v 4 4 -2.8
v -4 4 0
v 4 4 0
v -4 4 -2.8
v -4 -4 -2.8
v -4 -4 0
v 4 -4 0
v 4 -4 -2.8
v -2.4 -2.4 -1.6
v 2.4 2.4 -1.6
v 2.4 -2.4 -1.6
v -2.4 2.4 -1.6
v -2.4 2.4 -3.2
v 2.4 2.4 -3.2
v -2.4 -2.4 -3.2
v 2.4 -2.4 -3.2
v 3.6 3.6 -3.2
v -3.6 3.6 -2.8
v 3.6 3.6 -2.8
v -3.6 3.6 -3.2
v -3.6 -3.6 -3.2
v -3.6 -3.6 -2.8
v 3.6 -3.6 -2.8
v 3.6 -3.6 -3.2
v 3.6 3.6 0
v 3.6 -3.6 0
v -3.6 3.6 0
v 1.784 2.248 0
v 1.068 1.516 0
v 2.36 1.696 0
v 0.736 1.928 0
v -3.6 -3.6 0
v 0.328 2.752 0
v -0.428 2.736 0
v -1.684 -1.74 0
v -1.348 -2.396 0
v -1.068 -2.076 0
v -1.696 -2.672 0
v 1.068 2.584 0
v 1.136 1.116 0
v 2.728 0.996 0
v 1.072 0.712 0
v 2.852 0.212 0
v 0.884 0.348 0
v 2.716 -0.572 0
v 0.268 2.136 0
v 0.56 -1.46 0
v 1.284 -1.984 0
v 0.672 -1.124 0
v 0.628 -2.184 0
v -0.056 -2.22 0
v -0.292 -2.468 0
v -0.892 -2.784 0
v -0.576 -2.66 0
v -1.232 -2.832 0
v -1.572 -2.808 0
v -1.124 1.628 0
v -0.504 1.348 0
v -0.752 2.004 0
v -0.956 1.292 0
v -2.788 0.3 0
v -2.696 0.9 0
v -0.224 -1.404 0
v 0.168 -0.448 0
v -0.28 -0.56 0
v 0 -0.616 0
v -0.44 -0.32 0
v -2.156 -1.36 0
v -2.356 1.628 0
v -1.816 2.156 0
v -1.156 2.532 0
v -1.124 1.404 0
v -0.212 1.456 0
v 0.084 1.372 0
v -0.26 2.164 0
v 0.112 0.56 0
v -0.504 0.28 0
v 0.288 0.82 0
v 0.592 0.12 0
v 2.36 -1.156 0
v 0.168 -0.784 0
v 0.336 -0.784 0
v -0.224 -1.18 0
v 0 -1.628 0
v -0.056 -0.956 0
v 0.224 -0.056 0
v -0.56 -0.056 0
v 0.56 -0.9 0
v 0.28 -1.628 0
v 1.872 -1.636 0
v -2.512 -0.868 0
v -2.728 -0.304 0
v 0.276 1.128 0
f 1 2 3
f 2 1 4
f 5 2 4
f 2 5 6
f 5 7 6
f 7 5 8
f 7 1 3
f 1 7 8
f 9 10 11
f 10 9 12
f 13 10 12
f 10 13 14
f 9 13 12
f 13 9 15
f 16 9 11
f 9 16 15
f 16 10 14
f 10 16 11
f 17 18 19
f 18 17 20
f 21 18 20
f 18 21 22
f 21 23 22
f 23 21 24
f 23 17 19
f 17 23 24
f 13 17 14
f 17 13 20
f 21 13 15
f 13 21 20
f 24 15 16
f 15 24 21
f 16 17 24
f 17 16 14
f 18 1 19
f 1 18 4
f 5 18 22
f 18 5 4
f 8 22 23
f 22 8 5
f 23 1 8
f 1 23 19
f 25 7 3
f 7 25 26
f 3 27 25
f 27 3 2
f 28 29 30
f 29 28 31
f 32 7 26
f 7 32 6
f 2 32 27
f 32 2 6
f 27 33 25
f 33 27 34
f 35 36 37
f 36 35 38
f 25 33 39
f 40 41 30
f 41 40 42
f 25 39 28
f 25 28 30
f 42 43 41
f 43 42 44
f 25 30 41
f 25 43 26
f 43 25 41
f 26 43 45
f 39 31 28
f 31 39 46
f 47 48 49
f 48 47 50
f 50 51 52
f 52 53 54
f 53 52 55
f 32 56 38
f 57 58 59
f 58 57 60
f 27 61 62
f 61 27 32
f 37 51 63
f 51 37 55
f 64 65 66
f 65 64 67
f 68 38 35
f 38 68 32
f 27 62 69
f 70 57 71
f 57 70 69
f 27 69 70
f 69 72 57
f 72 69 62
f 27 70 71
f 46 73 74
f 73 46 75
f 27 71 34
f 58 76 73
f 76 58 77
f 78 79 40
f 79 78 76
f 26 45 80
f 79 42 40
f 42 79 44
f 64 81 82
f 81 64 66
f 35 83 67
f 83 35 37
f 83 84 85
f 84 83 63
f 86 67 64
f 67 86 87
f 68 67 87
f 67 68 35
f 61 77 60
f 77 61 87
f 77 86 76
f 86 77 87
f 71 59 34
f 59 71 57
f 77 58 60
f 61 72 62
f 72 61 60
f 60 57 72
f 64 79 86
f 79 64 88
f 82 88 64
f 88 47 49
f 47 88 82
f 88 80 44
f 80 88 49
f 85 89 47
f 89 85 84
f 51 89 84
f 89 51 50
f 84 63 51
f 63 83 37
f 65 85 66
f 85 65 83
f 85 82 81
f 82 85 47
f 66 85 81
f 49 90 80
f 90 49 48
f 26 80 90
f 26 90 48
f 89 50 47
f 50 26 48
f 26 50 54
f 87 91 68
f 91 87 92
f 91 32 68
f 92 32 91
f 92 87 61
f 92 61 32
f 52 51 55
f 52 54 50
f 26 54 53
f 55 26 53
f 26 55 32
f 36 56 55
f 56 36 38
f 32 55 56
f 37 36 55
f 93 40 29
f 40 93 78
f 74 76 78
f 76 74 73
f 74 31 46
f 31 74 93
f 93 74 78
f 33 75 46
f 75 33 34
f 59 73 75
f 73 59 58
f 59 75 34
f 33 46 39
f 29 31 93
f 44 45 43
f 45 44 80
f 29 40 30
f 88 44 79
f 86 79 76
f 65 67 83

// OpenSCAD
// file: ../p/4-4edge.scad
use <../lib.scad>
$fa=1; $fs=0.2;
function ldraw_lib__4_4edge(realsolid=false) = [
// 0 Circle 1.0
// 0 Name: 4-4edge.dat
// 0 Author: James Jessiman
// 0 !LDRAW_ORG Primitive UPDATE 2017-01
// 0 !LICENSE Licensed under CC BY 2.0 and CC BY 4.0 : see CAreadme.txt
// 
// 0 BFC CERTIFY CCW
  [0,"BFC","CERTIFY"],
  [0,"BFC","CCW"],
// 
// 0 !HISTORY 1998-12-15 [PTadmin] Official Update 1998-10
// 0 !HISTORY 2005-12-28 [PTadmin] Official Update 2005-01
// 0 !HISTORY 2007-06-24 [PTadmin] Header formatted for Contributor Agreement
// 0 !HISTORY 2008-07-01 [PTadmin] Official Update 2008-01
// 0 !HISTORY 2017-01-15 [Steffen] BFCed
// 0 !HISTORY 2017-12-30 [PTadmin] Official Update 2017-01
// 
// 
// 2 24 1 0 0 0.9239 0 0.3827
  [2,24,1,0,0,0.9239,0,0.3827],
// 2 24 0.9239 0 0.3827 0.7071 0 0.7071
  [2,24,0.9239,0,0.3827,0.7071,0,0.7071],
// 2 24 0.7071 0 0.7071 0.3827 0 0.9239
  [2,24,0.7071,0,0.7071,0.3827,0,0.9239],
// 2 24 0.3827 0 0.9239 0 0 1
  [2,24,0.3827,0,0.9239,0,0,1],
// 2 24 0 0 1 -0.3827 0 0.9239
  [2,24,0,0,1,-0.3827,0,0.9239],
// 2 24 -0.3827 0 0.9239 -0.7071 0 0.7071
  [2,24,-0.3827,0,0.9239,-0.7071,0,0.7071],
// 2 24 -0.7071 0 0.7071 -0.9239 0 0.3827
  [2,24,-0.7071,0,0.7071,-0.9239,0,0.3827],
// 2 24 -0.9239 0 0.3827 -1 0 -0
  [2,24,-0.9239,0,0.3827,-1,0,-0],
// 2 24 -1 0 -0 -0.9239 0 -0.3827
  [2,24,-1,0,-0,-0.9239,0,-0.3827],
// 2 24 -0.9239 0 -0.3827 -0.7071 0 -0.7071
  [2,24,-0.9239,0,-0.3827,-0.7071,0,-0.7071],
// 2 24 -0.7071 0 -0.7071 -0.3827 0 -0.9239
  [2,24,-0.7071,0,-0.7071,-0.3827,0,-0.9239],
// 2 24 -0.3827 0 -0.9239 0 0 -1
  [2,24,-0.3827,0,-0.9239,0,0,-1],
// 2 24 0 0 -1 0.3827 0 -0.9239
  [2,24,0,0,-1,0.3827,0,-0.9239],
// 2 24 0.3827 0 -0.9239 0.7071 0 -0.7071
  [2,24,0.3827,0,-0.9239,0.7071,0,-0.7071],
// 2 24 0.7071 0 -0.7071 0.9239 0 -0.3827
  [2,24,0.7071,0,-0.7071,0.9239,0,-0.3827],
// 2 24 0.9239 0 -0.3827 1 0 0
  [2,24,0.9239,0,-0.3827,1,0,0],
];
module ldraw_lib__4_4edge(step=0, col=false, unit=2/5, alt=false, line=0.2, solid=!$preview)
    makepoly(ldraw_lib__4_4edge(solid), step=step, col=col, unit=unit, alt=alt, line=line, solid=solid);
ldraw_lib__4_4edge(line=0.2);
// file: ../p/4-4disc.scad
use <../lib.scad>
$fa=1; $fs=0.2;
function ldraw_lib__4_4disc(realsolid=false) = [
// 0 Disc 1.0
// 0 Name: 4-4disc.dat
// 0 Author: James Jessiman
// 0 !LDRAW_ORG Primitive UPDATE 2002-02
// 0 !LICENSE Licensed under CC BY 2.0 and CC BY 4.0 : see CAreadme.txt
// 
// 0 BFC CERTIFY CCW
  [0,"BFC","CERTIFY"],
  [0,"BFC","CCW"],
// 
// 0 !HISTORY 1998-12-15 [PTadmin] Official Update 1998-10
// 0 !HISTORY 2002-03-23 [sbliss] Added BFC statement
// 0 !HISTORY 2002-04-25 [PTadmin] Official Update 2002-02
// 0 !HISTORY 2007-06-24 [PTadmin] Header formatted for Contributor Agreement
// 0 !HISTORY 2008-07-01 [PTadmin] Official Update 2008-01
// 
// 
// 3 16 0 0 0 1 0 0 0.9239 0 0.3827
  [3,16,0,0,0,1,0,0,0.9239,0,0.3827],
// 3 16 0 0 0 0.9239 0 0.3827 0.7071 0 0.7071
  [3,16,0,0,0,0.9239,0,0.3827,0.7071,0,0.7071],
// 3 16 0 0 0 0.7071 0 0.7071 0.3827 0 0.9239
  [3,16,0,0,0,0.7071,0,0.7071,0.3827,0,0.9239],
// 3 16 0 0 0 0.3827 0 0.9239 0 0 1
  [3,16,0,0,0,0.3827,0,0.9239,0,0,1],
// 3 16 0 0 0 0 0 1 -0.3827 0 0.9239
  [3,16,0,0,0,0,0,1,-0.3827,0,0.9239],
// 3 16 0 0 0 -0.3827 0 0.9239 -0.7071 0 0.7071
  [3,16,0,0,0,-0.3827,0,0.9239,-0.7071,0,0.7071],
// 3 16 0 0 0 -0.7071 0 0.7071 -0.9239 0 0.3827
  [3,16,0,0,0,-0.7071,0,0.7071,-0.9239,0,0.3827],
// 3 16 0 0 0 -0.9239 0 0.3827 -1 0 -0
  [3,16,0,0,0,-0.9239,0,0.3827,-1,0,-0],
// 3 16 0 0 0 -1 0 -0 -0.9239 0 -0.3827
  [3,16,0,0,0,-1,0,-0,-0.9239,0,-0.3827],
// 3 16 0 0 0 -0.9239 0 -0.3827 -0.7071 0 -0.7071
  [3,16,0,0,0,-0.9239,0,-0.3827,-0.7071,0,-0.7071],
// 3 16 0 0 0 -0.7071 0 -0.7071 -0.3827 0 -0.9239
  [3,16,0,0,0,-0.7071,0,-0.7071,-0.3827,0,-0.9239],
// 3 16 0 0 0 -0.3827 0 -0.9239 0 0 -1
  [3,16,0,0,0,-0.3827,0,-0.9239,0,0,-1],
// 3 16 0 0 0 0 0 -1 0.3827 0 -0.9239
  [3,16,0,0,0,0,0,-1,0.3827,0,-0.9239],
// 3 16 0 0 0 0.3827 0 -0.9239 0.7071 0 -0.7071
  [3,16,0,0,0,0.3827,0,-0.9239,0.7071,0,-0.7071],
// 3 16 0 0 0 0.7071 0 -0.7071 0.9239 0 -0.3827
  [3,16,0,0,0,0.7071,0,-0.7071,0.9239,0,-0.3827],
// 3 16 0 0 0 0.9239 0 -0.3827 1 0 0
  [3,16,0,0,0,0.9239,0,-0.3827,1,0,0],
// 0
];
module ldraw_lib__4_4disc(step=0, col=false, unit=2/5, alt=false, line=0.2, solid=!$preview)
    makepoly(ldraw_lib__4_4disc(solid), step=step, col=col, unit=unit, alt=alt, line=line, solid=solid);
ldraw_lib__4_4disc(line=0.2);
// file: ../p/4-4cyli.scad
use <../lib.scad>
$fa=1; $fs=0.2;
function ldraw_lib__4_4cyli(realsolid=false) = [
// 0 Cylinder 1.0
// 0 Name: 4-4cyli.dat
// 0 Author: James Jessiman
// 0 !LDRAW_ORG Primitive UPDATE 2005-01
// 0 !LICENSE Licensed under CC BY 2.0 and CC BY 4.0 : see CAreadme.txt
// 
// 0 BFC CERTIFY CCW
  [0,"BFC","CERTIFY"],
  [0,"BFC","CCW"],
// 
// 0 !HISTORY 1998-12-15 [PTadmin] Official Update 1998-10
// 0 !HISTORY 2002-03-23 [sbliss] Added BFC statement; merged headers from files in distributions LDraw 0.27 and Complete.
// 0 !HISTORY 2002-04-25 [PTadmin] Official Update 2002-02
// 0 !HISTORY 2004-12-14 [guyvivan] BFC CCW
// 0 !HISTORY 2005-12-28 [PTadmin] Official Update 2005-01
// 0 !HISTORY 2007-06-24 [PTadmin] Header formatted for Contributor Agreement
// 0 !HISTORY 2008-07-01 [PTadmin] Official Update 2008-01
// 
// 
// 4 16 1 1 0 0.9239 1 0.3827 0.9239 0 0.3827 1 0 0
  [4,16,1,1,0,0.9239,1,0.3827,0.9239,0,0.3827,1,0,0],
// 5 24 1 0 0 1 1 0 0.9239 0 0.3827 0.9239 0 -0.3827
  [5,24,1,0,0,1,1,0,0.9239,0,0.3827,0.9239,0,-0.3827],
// 4 16 0.9239 1 0.3827 0.7071 1 0.7071 0.7071 0 0.7071 0.9239 0 0.3827
  [4,16,0.9239,1,0.3827,0.7071,1,0.7071,0.7071,0,0.7071,0.9239,0,0.3827],
// 5 24 0.9239 0 0.3827 0.9239 1 0.3827 0.7071 0 0.7071 1 0 0
  [5,24,0.9239,0,0.3827,0.9239,1,0.3827,0.7071,0,0.7071,1,0,0],
// 4 16 0.7071 1 0.7071 0.3827 1 0.9239 0.3827 0 0.9239 0.7071 0 0.7071
  [4,16,0.7071,1,0.7071,0.3827,1,0.9239,0.3827,0,0.9239,0.7071,0,0.7071],
// 5 24 0.7071 0 0.7071 0.7071 1 0.7071 0.3827 0 0.9239 0.9239 0 0.3827
  [5,24,0.7071,0,0.7071,0.7071,1,0.7071,0.3827,0,0.9239,0.9239,0,0.3827],
// 4 16 0.3827 1 0.9239 0 1 1 0 0 1 0.3827 0 0.9239
  [4,16,0.3827,1,0.9239,0,1,1,0,0,1,0.3827,0,0.9239],
// 5 24 0.3827 0 0.9239 0.3827 1 0.9239 0 0 1 0.7071 0 0.7071
  [5,24,0.3827,0,0.9239,0.3827,1,0.9239,0,0,1,0.7071,0,0.7071],
// 4 16 0 1 1 -0.3827 1 0.9239 -0.3827 0 0.9239 0 0 1
  [4,16,0,1,1,-0.3827,1,0.9239,-0.3827,0,0.9239,0,0,1],
// 5 24 0 0 1 0 1 1 -0.3827 0 0.9239 0.3827 0 0.9239
  [5,24,0,0,1,0,1,1,-0.3827,0,0.9239,0.3827,0,0.9239],
// 4 16 -0.3827 1 0.9239 -0.7071 1 0.7071 -0.7071 0 0.7071 -0.3827 0 0.9239
  [4,16,-0.3827,1,0.9239,-0.7071,1,0.7071,-0.7071,0,0.7071,-0.3827,0,0.9239],
// 5 24 -0.3827 0 0.9239 -0.3827 1 0.9239 -0.7071 0 0.7071 0 0 1
  [5,24,-0.3827,0,0.9239,-0.3827,1,0.9239,-0.7071,0,0.7071,0,0,1],
// 4 16 -0.7071 1 0.7071 -0.9239 1 0.3827 -0.9239 0 0.3827 -0.7071 0 0.7071
  [4,16,-0.7071,1,0.7071,-0.9239,1,0.3827,-0.9239,0,0.3827,-0.7071,0,0.7071],
// 5 24 -0.7071 0 0.7071 -0.7071 1 0.7071 -0.9239 0 0.3827 -0.3827 0 0.9239
  [5,24,-0.7071,0,0.7071,-0.7071,1,0.7071,-0.9239,0,0.3827,-0.3827,0,0.9239],
// 4 16 -0.9239 1 0.3827 -1 1 0 -1 0 0 -0.9239 0 0.3827
  [4,16,-0.9239,1,0.3827,-1,1,0,-1,0,0,-0.9239,0,0.3827],
// 5 24 -0.9239 0 0.3827 -0.9239 1 0.3827 -1 0 0 -0.7071 0 0.7071
  [5,24,-0.9239,0,0.3827,-0.9239,1,0.3827,-1,0,0,-0.7071,0,0.7071],
// 4 16 -1 1 0 -0.9239 1 -0.3827 -0.9239 0 -0.3827 -1 0 0
  [4,16,-1,1,0,-0.9239,1,-0.3827,-0.9239,0,-0.3827,-1,0,0],
// 5 24 -1 0 0 -1 1 0 -0.9239 0 -0.3827 -0.9239 0 0.3827
  [5,24,-1,0,0,-1,1,0,-0.9239,0,-0.3827,-0.9239,0,0.3827],
// 4 16 -0.9239 1 -0.3827 -0.7071 1 -0.7071 -0.7071 0 -0.7071 -0.9239 0 -0.3827
  [4,16,-0.9239,1,-0.3827,-0.7071,1,-0.7071,-0.7071,0,-0.7071,-0.9239,0,-0.3827],
// 5 24 -0.9239 0 -0.3827 -0.9239 1 -0.3827 -0.7071 0 -0.7071 -1 0 0
  [5,24,-0.9239,0,-0.3827,-0.9239,1,-0.3827,-0.7071,0,-0.7071,-1,0,0],
// 4 16 -0.7071 1 -0.7071 -0.3827 1 -0.9239 -0.3827 0 -0.9239 -0.7071 0 -0.7071
  [4,16,-0.7071,1,-0.7071,-0.3827,1,-0.9239,-0.3827,0,-0.9239,-0.7071,0,-0.7071],
// 5 24 -0.7071 0 -0.7071 -0.7071 1 -0.7071 -0.3827 0 -0.9239 -0.9239 0 -0.3827
  [5,24,-0.7071,0,-0.7071,-0.7071,1,-0.7071,-0.3827,0,-0.9239,-0.9239,0,-0.3827],
// 4 16 -0.3827 1 -0.9239 0 1 -1 0 0 -1 -0.3827 0 -0.9239
  [4,16,-0.3827,1,-0.9239,0,1,-1,0,0,-1,-0.3827,0,-0.9239],
// 5 24 -0.3827 0 -0.9239 -0.3827 1 -0.9239 0 0 -1 -0.7071 0 -0.7071
  [5,24,-0.3827,0,-0.9239,-0.3827,1,-0.9239,0,0,-1,-0.7071,0,-0.7071],
// 4 16 0 1 -1 0.3827 1 -0.9239 0.3827 0 -0.9239 0 0 -1
  [4,16,0,1,-1,0.3827,1,-0.9239,0.3827,0,-0.9239,0,0,-1],
// 5 24 0 0 -1 0 1 -1 0.3827 0 -0.9239 -0.3827 0 -0.9239
  [5,24,0,0,-1,0,1,-1,0.3827,0,-0.9239,-0.3827,0,-0.9239],
// 4 16 0.3827 1 -0.9239 0.7071 1 -0.7071 0.7071 0 -0.7071 0.3827 0 -0.9239
  [4,16,0.3827,1,-0.9239,0.7071,1,-0.7071,0.7071,0,-0.7071,0.3827,0,-0.9239],
// 5 24 0.3827 0 -0.9239 0.3827 1 -0.9239 0.7071 0 -0.7071 0 0 -1
  [5,24,0.3827,0,-0.9239,0.3827,1,-0.9239,0.7071,0,-0.7071,0,0,-1],
// 4 16 0.7071 1 -0.7071 0.9239 1 -0.3827 0.9239 0 -0.3827 0.7071 0 -0.7071
  [4,16,0.7071,1,-0.7071,0.9239,1,-0.3827,0.9239,0,-0.3827,0.7071,0,-0.7071],
// 5 24 0.7071 0 -0.7071 0.7071 1 -0.7071 0.9239 0 -0.3827 0.3827 0 -0.9239
  [5,24,0.7071,0,-0.7071,0.7071,1,-0.7071,0.9239,0,-0.3827,0.3827,0,-0.9239],
// 4 16 0.9239 1 -0.3827 1 1 0 1 0 0 0.9239 0 -0.3827
  [4,16,0.9239,1,-0.3827,1,1,0,1,0,0,0.9239,0,-0.3827],
// 5 24 0.9239 0 -0.3827 0.9239 1 -0.3827 1 0 0 0.7071 0 -0.7071
  [5,24,0.9239,0,-0.3827,0.9239,1,-0.3827,1,0,0,0.7071,0,-0.7071],
// 0
];
module ldraw_lib__4_4cyli(step=0, col=false, unit=2/5, alt=false, line=0.2, solid=!$preview)
    makepoly(ldraw_lib__4_4cyli(solid), step=step, col=col, unit=unit, alt=alt, line=line, solid=solid);
ldraw_lib__4_4cyli(line=0.2);
// file: ../p/stud3.scad
use <../lib.scad>
use <4-4cyli.scad>
use <4-4disc.scad>
use <4-4edge.scad>
$fa=1; $fs=0.2;
function ldraw_lib__stud3(realsolid=false) = realsolid ? 
    [openscad(translate([0,0,-eps()], o=cylinder(4+eps(), r=4)),2)] : [
// 0 Stud Tube Solid
// 0 Name: stud3.dat
// 0 Author: James Jessiman
// 0 !LDRAW_ORG Primitive UPDATE 2012-01
// 0 !LICENSE Licensed under CC BY 2.0 and CC BY 4.0 : see CAreadme.txt
// 
// 0 BFC CERTIFY CCW
  [0,"BFC","CERTIFY"],
  [0,"BFC","CCW"],
// 
// 0 !HISTORY 2002-04-04 [sbliss] Modified for BFC compliance
// 0 !HISTORY 2002-04-25 [PTadmin] Official Update 2002-02
// 0 !HISTORY 2007-06-24 [PTadmin] Header formatted for Contributor Agreement
// 0 !HISTORY 2008-07-01 [PTadmin] Official Update 2008-01
// 0 !HISTORY 2012-02-16 [Philo] Changed to CCW
// 0 !HISTORY 2012-03-30 [PTadmin] Official Update 2012-01
// 
// 
// 1 16 0 -4 0 4 0 0 0 1 0 0 0 4 4-4edge.dat
  [1,16,0,-4,0,4,0,0,0,1,0,0,0,4, ldraw_lib__4_4edge(realsolid)],
// 1 16 0 0 0 4 0 0 0 1 0 0 0 4 4-4edge.dat
  [1,16,0,0,0,4,0,0,0,1,0,0,0,4, ldraw_lib__4_4edge(realsolid)],
// 1 16 0 -4 0 4 0 0 0 1 0 0 0 4 4-4disc.dat
  [1,16,0,-4,0,4,0,0,0,1,0,0,0,4, ldraw_lib__4_4disc(realsolid)],
// 1 16 0 -4 0 4 0 0 0 4 0 0 0 4 4-4cyli.dat
  [1,16,0,-4,0,4,0,0,0,4,0,0,0,4, ldraw_lib__4_4cyli(realsolid)],
];
module ldraw_lib__stud3(step=0, col=false, unit=2/5, alt=false, line=0.2, solid=!$preview)
    makepoly(ldraw_lib__stud3(solid), step=step, col=col, unit=unit, alt=alt, line=line, solid=solid);
ldraw_lib__stud3(line=0.2);
// file: ../p/stud.scad
use <../lib.scad>
use <4-4cyli.scad>
use <4-4disc.scad>
use <4-4edge.scad>
$fa=1; $fs=0.2;
function ldraw_lib__stud(realsolid=false) = realsolid ? 
    [openscad(translate([0,0,-eps()], o=cylinder(4+eps(), r=6)),2)] : [
// 0 Stud
// 0 Name: stud.dat
// 0 Author: James Jessiman
// 0 !LDRAW_ORG Primitive UPDATE 2012-01
// 0 !LICENSE Licensed under CC BY 2.0 and CC BY 4.0 : see CAreadme.txt
// 
// 0 BFC CERTIFY CCW
  [0,"BFC","CERTIFY"],
  [0,"BFC","CCW"],
// 
// 0 !HISTORY 2002-04-04 [sbliss] Modified for BFC compliance
// 0 !HISTORY 2002-04-25 [PTadmin] Official Update 2002-02
// 0 !HISTORY 2007-06-24 [PTadmin] Header formatted for Contributor Agreement
// 0 !HISTORY 2008-07-01 [PTadmin] Official Update 2008-01
// 0 !HISTORY 2012-02-16 [Philo] Changed to CCW
// 0 !HISTORY 2012-03-30 [PTadmin] Official Update 2012-01
// 
// 
// 1 16 0 0 0 6 0 0 0 1 0 0 0 6 4-4edge.dat
  [1,16,0,0,0,6,0,0,0,1,0,0,0,6, ldraw_lib__4_4edge(realsolid)],
// 1 16 0 -4 0 6 0 0 0 1 0 0 0 6 4-4edge.dat
  [1,16,0,-4,0,6,0,0,0,1,0,0,0,6, ldraw_lib__4_4edge(realsolid)],
// 1 16 0 0 0 6 0 0 0 -4 0 0 0 6 4-4cyli.dat
  [1,16,0,0,0,6,0,0,0,-4,0,0,0,6, ldraw_lib__4_4cyli(realsolid)],
// 1 16 0 -4 0 6 0 0 0 1 0 0 0 6 4-4disc.dat
  [1,16,0,-4,0,6,0,0,0,1,0,0,0,6, ldraw_lib__4_4disc(realsolid)],
];
module ldraw_lib__stud(step=0, col=false, unit=2/5, alt=false, line=0.2, solid=!$preview)
    makepoly(ldraw_lib__stud(solid), step=step, col=col, unit=unit, alt=alt, line=line, solid=solid);
ldraw_lib__stud(line=0.2);
// file: ../p/box4t.scad
use <../lib.scad>
$fa=1; $fs=0.2;
function ldraw_lib__box4t(realsolid=false) = [
// 0 Box with 4 Adjacent Faces and All Edges
// 0 Name: box4t.dat
// 0 Author: Tore Eriksson [Tore_Eriksson]
// 0 !LDRAW_ORG Primitive UPDATE 2003-02
// 0 !LICENSE Licensed under CC BY 2.0 and CC BY 4.0 : see CAreadme.txt
// 
// 0 BFC CERTIFY CCW
  [0,"BFC","CERTIFY"],
  [0,"BFC","CCW"],
// 
// 0 !HISTORY 1997-09-29 [PTadmin] Official Update 1997-15
// 0 !HISTORY 2002-08-31 [izanette] Modified with WINDZ for BFC compliance
// 0 !HISTORY 2003-08-01 [PTadmin] Official Update 2003-02
// 0 !HISTORY 2007-06-24 [PTadmin] Header formatted for Contributor Agreement
// 0 !HISTORY 2008-07-01 [PTadmin] Official Update 2008-01
// 
// 
// 2 24 1 1 1 -1 1 1
  [2,24,1,1,1,-1,1,1],
// 2 24 -1 1 1 -1 1 -1
  [2,24,-1,1,1,-1,1,-1],
// 2 24 -1 1 -1 1 1 -1
  [2,24,-1,1,-1,1,1,-1],
// 2 24 1 1 -1 1 1 1
  [2,24,1,1,-1,1,1,1],
// 2 24 1 0 1 -1 0 1
  [2,24,1,0,1,-1,0,1],
// 2 24 -1 0 1 -1 0 -1
  [2,24,-1,0,1,-1,0,-1],
// 2 24 -1 0 -1 1 0 -1
  [2,24,-1,0,-1,1,0,-1],
// 2 24 1 0 -1 1 0 1
  [2,24,1,0,-1,1,0,1],
// 2 24 1 0 1 1 1 1
  [2,24,1,0,1,1,1,1],
// 2 24 -1 0 1 -1 1 1
  [2,24,-1,0,1,-1,1,1],
// 2 24 1 0 -1 1 1 -1
  [2,24,1,0,-1,1,1,-1],
// 2 24 -1 0 -1 -1 1 -1
  [2,24,-1,0,-1,-1,1,-1],
// 4 16 1 1 1 1 1 -1 -1 1 -1 -1 1 1
  [4,16,1,1,1,1,1,-1,-1,1,-1,-1,1,1],
// 4 16 1 1 1 -1 1 1 -1 0 1 1 0 1
  [4,16,1,1,1,-1,1,1,-1,0,1,1,0,1],
// 4 16 -1 1 1 -1 1 -1 -1 0 -1 -1 0 1
  [4,16,-1,1,1,-1,1,-1,-1,0,-1,-1,0,1],
// 0 4 16 -1 1 -1 -1 0 -1 1 0 -1 1 1 -1
// 4 16 1 1 -1 1 1 1 1 0 1 1 0 -1
  [4,16,1,1,-1,1,1,1,1,0,1,1,0,-1],
// 0
];
module ldraw_lib__box4t(step=0, col=false, unit=2/5, alt=false, line=0.2, solid=!$preview)
    makepoly(ldraw_lib__box4t(solid), step=step, col=col, unit=unit, alt=alt, line=line, solid=solid);
ldraw_lib__box4t(line=0.2);
// file: s/3004s01.scad
use <../../lib.scad>
use <../../p/box4t.scad>
use <../../p/box5.scad>
use <../../p/stud.scad>
use <../../p/stud3.scad>
$fa=1; $fs=0.2;
function ldraw_lib__s__3004s01(realsolid=false) = [
// 0 ~Brick  1 x  2 without Front Face
// 0 Name: s\3004s01.dat
// 0 Author: James Jessiman
// 0 !LDRAW_ORG Subpart UPDATE 2003-03
// 0 !LICENSE Licensed under CC BY 2.0 and CC BY 4.0 : see CAreadme.txt
// 
// 0 BFC CERTIFY CCW
  [0,"BFC","CERTIFY"],
  [0,"BFC","CCW"],
// 
// 0 !HISTORY 2003-09-07 [jriley] Subfiling, BFC
// 0 !HISTORY 2003-12-19 [PTadmin] Official Update 2003-03
// 0 !HISTORY 2007-08-29 [PTadmin] Header formatted for Contributor Agreement
// 0 !HISTORY 2008-07-01 [PTadmin] Official Update 2008-01
// 
// 
// 1 16 0 4 0 1 0 0 0 -5 0 0 0 1 stud3.dat
  [1,16,0,4,0,1,0,0,0,-5,0,0,0,1, ldraw_lib__stud3(realsolid)],
// 0 BFC INVERTNEXT
  [0,"BFC","INVERTNEXT"],
// 1 16 0 24 0 16 0 0 0 -20 0 0 0 6 box5.dat
  [1,16,0,24,0,16,0,0,0,-20,0,0,0,6, ldraw_lib__box5(realsolid)],
// 4 16 20 24 10 16 24 6 -16 24 6 -20 24 10
  [4,16,20,24,10,16,24,6,-16,24,6,-20,24,10],
// 4 16 -20 24 10 -16 24 6 -16 24 -6 -20 24 -10
  [4,16,-20,24,10,-16,24,6,-16,24,-6,-20,24,-10],
// 4 16 -20 24 -10 -16 24 -6 16 24 -6 20 24 -10
  [4,16,-20,24,-10,-16,24,-6,16,24,-6,20,24,-10],
// 4 16 20 24 -10 16 24 -6 16 24 6 20 24 10
  [4,16,20,24,-10,16,24,-6,16,24,6,20,24,10],
// 1 16 0 24 0 20 0 0 0 -24 0 0 0 10 box4t.dat
  [1,16,0,24,0,20,0,0,0,-24,0,0,0,10, ldraw_lib__box4t(realsolid)],
// 1 16 10 0 0 1 0 0 0 1 0 0 0 1 stud.dat
  [1,16,10,0,0,1,0,0,0,1,0,0,0,1, ldraw_lib__stud(realsolid)],
// 1 16 -10 0 0 1 0 0 0 1 0 0 0 1 stud.dat
  [1,16,-10,0,0,1,0,0,0,1,0,0,0,1, ldraw_lib__stud(realsolid)],
// 0
];
module ldraw_lib__s__3004s01(step=0, col=false, unit=2/5, alt=false, line=0.2, solid=!$preview)
    makepoly(ldraw_lib__s__3004s01(solid), step=step, col=col, unit=unit, alt=alt, line=line, solid=solid);
ldraw_lib__s__3004s01(line=0.2);
// file: ../p/box5.scad
use <../lib.scad>
$fa=1; $fs=0.2;
function ldraw_lib__box5(realsolid=false) = [
// 0 Box with 5 Faces and All Edges
// 0 Name: box5.dat
// 0 Author: James Jessiman
// 0 !LDRAW_ORG Primitive UPDATE 2012-01
// 0 !LICENSE Licensed under CC BY 2.0 and CC BY 4.0 : see CAreadme.txt
// 
// 0 BFC CERTIFY CCW
  [0,"BFC","CERTIFY"],
  [0,"BFC","CCW"],
// 
// 0 !HISTORY 2002-04-03 [sbliss] Modified for BFC compliance
// 0 !HISTORY 2002-04-25 [PTadmin] Official Update 2002-02
// 0 !HISTORY 2007-06-24 [PTadmin] Header formatted for Contributor Agreement
// 0 !HISTORY 2008-07-01 [PTadmin] Official Update 2008-01
// 0 !HISTORY 2012-02-16 [Philo] Changed to CCW
// 0 !HISTORY 2012-03-30 [PTadmin] Official Update 2012-01
// 
// 
// 2 24 1 1 1 -1 1 1
  [2,24,1,1,1,-1,1,1],
// 2 24 -1 1 1 -1 1 -1
  [2,24,-1,1,1,-1,1,-1],
// 2 24 -1 1 -1 1 1 -1
  [2,24,-1,1,-1,1,1,-1],
// 2 24 1 1 -1 1 1 1
  [2,24,1,1,-1,1,1,1],
// 2 24 1 0 1 -1 0 1
  [2,24,1,0,1,-1,0,1],
// 2 24 -1 0 1 -1 0 -1
  [2,24,-1,0,1,-1,0,-1],
// 2 24 -1 0 -1 1 0 -1
  [2,24,-1,0,-1,1,0,-1],
// 2 24 1 0 -1 1 0 1
  [2,24,1,0,-1,1,0,1],
// 2 24 1 0 1 1 1 1
  [2,24,1,0,1,1,1,1],
// 2 24 -1 0 1 -1 1 1
  [2,24,-1,0,1,-1,1,1],
// 2 24 1 0 -1 1 1 -1
  [2,24,1,0,-1,1,1,-1],
// 2 24 -1 0 -1 -1 1 -1
  [2,24,-1,0,-1,-1,1,-1],
// 4 16 -1 1 1 1 1 1 1 1 -1 -1 1 -1
  [4,16,-1,1,1,1,1,1,1,1,-1,-1,1,-1],
// 4 16 -1 1 1 -1 0 1 1 0 1 1 1 1
  [4,16,-1,1,1,-1,0,1,1,0,1,1,1,1],
// 4 16 -1 1 -1 -1 0 -1 -1 0 1 -1 1 1
  [4,16,-1,1,-1,-1,0,-1,-1,0,1,-1,1,1],
// 4 16 1 1 -1 1 0 -1 -1 0 -1 -1 1 -1
  [4,16,1,1,-1,1,0,-1,-1,0,-1,-1,1,-1],
// 4 16 1 1 1 1 0 1 1 0 -1 1 1 -1
  [4,16,1,1,1,1,0,1,1,0,-1,1,1,-1],
];
module ldraw_lib__box5(step=0, col=false, unit=2/5, alt=false, line=0.2, solid=!$preview)
    makepoly(ldraw_lib__box5(solid), step=step, col=col, unit=unit, alt=alt, line=line, solid=solid);
ldraw_lib__box5(line=0.2);
// file: ../p/box4.scad
use <../lib.scad>
$fa=1; $fs=0.2;
function ldraw_lib__box4(realsolid=false) = [
// 0 Box with 4 Faces (2 Parallel Pairs) and All Edges
// 0 Name: box4.dat
// 0 Author: James Jessiman
// 0 !LDRAW_ORG Primitive UPDATE 2012-01
// 0 !LICENSE Licensed under CC BY 2.0 and CC BY 4.0 : see CAreadme.txt
// 
// 0 BFC CERTIFY CCW
  [0,"BFC","CERTIFY"],
  [0,"BFC","CCW"],
// 
// 0 !HISTORY 2002-04-03 [sbliss] Modified for BFC compliance
// 0 !HISTORY 2002-04-25 [PTadmin] Official Update 2002-02
// 0 !HISTORY 2007-06-24 [PTadmin] Header formatted for Contributor Agreement
// 0 !HISTORY 2008-07-01 [PTadmin] Official Update 2008-01
// 0 !HISTORY 2012-02-16 [Philo] Changed to CCW
// 0 !HISTORY 2012-03-30 [PTadmin] Official Update 2012-01
// 
// 
// 2 24 1 1 1 -1 1 1
  [2,24,1,1,1,-1,1,1],
// 2 24 -1 1 1 -1 1 -1
  [2,24,-1,1,1,-1,1,-1],
// 2 24 -1 1 -1 1 1 -1
  [2,24,-1,1,-1,1,1,-1],
// 2 24 1 1 -1 1 1 1
  [2,24,1,1,-1,1,1,1],
// 2 24 1 0 1 -1 0 1
  [2,24,1,0,1,-1,0,1],
// 2 24 -1 0 1 -1 0 -1
  [2,24,-1,0,1,-1,0,-1],
// 2 24 -1 0 -1 1 0 -1
  [2,24,-1,0,-1,1,0,-1],
// 2 24 1 0 -1 1 0 1
  [2,24,1,0,-1,1,0,1],
// 2 24 1 0 1 1 1 1
  [2,24,1,0,1,1,1,1],
// 2 24 -1 0 1 -1 1 1
  [2,24,-1,0,1,-1,1,1],
// 2 24 1 0 -1 1 1 -1
  [2,24,1,0,-1,1,1,-1],
// 2 24 -1 0 -1 -1 1 -1
  [2,24,-1,0,-1,-1,1,-1],
// 4 16 -1 1 1 -1 0 1 1 0 1 1 1 1
  [4,16,-1,1,1,-1,0,1,1,0,1,1,1,1],
// 4 16 -1 1 -1 -1 0 -1 -1 0 1 -1 1 1
  [4,16,-1,1,-1,-1,0,-1,-1,0,1,-1,1,1],
// 4 16 1 1 -1 1 0 -1 -1 0 -1 -1 1 -1
  [4,16,1,1,-1,1,0,-1,-1,0,-1,-1,1,-1],
// 4 16 1 1 1 1 0 1 1 0 -1 1 1 -1
  [4,16,1,1,1,1,0,1,1,0,-1,1,1,-1],
];
module ldraw_lib__box4(step=0, col=false, unit=2/5, alt=false, line=0.2, solid=!$preview)
    makepoly(ldraw_lib__box4(solid), step=step, col=col, unit=unit, alt=alt, line=line, solid=solid);
ldraw_lib__box4(line=0.2);
// file: 3004.scad
use <../lib.scad>
use <s/3004s01.scad>
$fa=1; $fs=0.2;
function ldraw_lib__3004(realsolid=false) = [
// 0 Brick  1 x  2
// 0 Name: 3004.dat
// 0 Author: James Jessiman
// 0 !LDRAW_ORG Part UPDATE 2022-05
// 0 !LICENSE Licensed under CC BY 2.0 and CC BY 4.0 : see CAreadme.txt
// 
// 0 BFC CERTIFY CCW
  [0,"BFC","CERTIFY"],
  [0,"BFC","CCW"],
// 
// 0 !HISTORY 2001-10-26 [PTadmin] Official Update 2001-01
// 0 !HISTORY 2002-05-07 {unknown} BFC Certification
// 0 !HISTORY 2002-06-11 [PTadmin] Official Update 2002-03
// 0 !HISTORY 2007-05-07 [PTadmin] Header formatted for Contributor Agreement
// 0 !HISTORY 2008-07-01 [PTadmin] Official Update 2008-01
// 0 !HISTORY 2022-08-04 [MagFors] Using subfile
// 0 !HISTORY 2022-09-15 [PTadmin] Official Update 2022-05
// 
// 
// 1 16 0 0 0 1 0 0 0 1 0 0 0 1 s\3004s01.dat
  [1,16,0,0,0,1,0,0,0,1,0,0,0,1, ldraw_lib__s__3004s01(realsolid)],
// 4 16 -20 24 -10 20 24 -10 20 0 -10 -20 0 -10
  [4,16,-20,24,-10,20,24,-10,20,0,-10,-20,0,-10],
];
module ldraw_lib__3004(step=0, col=false, unit=2/5, alt=false, line=0.2, solid=!$preview)
    makepoly(ldraw_lib__3004(solid), step=step, col=col, unit=unit, alt=alt, line=line, solid=solid);
ldraw_lib__3004(line=0.2);
// file: s/3070bs01.scad
use <../../lib.scad>
use <../../p/box4.scad>
use <../../p/box5.scad>
$fa=1; $fs=0.2;
function ldraw_lib__s__3070bs01(realsolid=false) = [
// 0 ~Tile  1 x  1 with Groove without Top Face
// 0 Name: s\3070bs01.dat
// 0 Author: Chris Dee [cwdee]
// 0 !LDRAW_ORG Subpart UPDATE 2009-02
// 0 !LICENSE Licensed under CC BY 2.0 and CC BY 4.0 : see CAreadme.txt
// 
// 0 BFC CERTIFY CCW
  [0,"BFC","CERTIFY"],
  [0,"BFC","CCW"],
// 
// 0 !HISTORY 2009-09-03 [PTadmin] Official Update 2009-02
// 
// 
// 1 16 0 0 0 10 0 0 0 7 0 0 0 10 box4.dat
  [1,16,0,0,0,10,0,0,0,7,0,0,0,10, ldraw_lib__box4(realsolid)],
// 0 BFC INVERTNEXT
  [0,"BFC","INVERTNEXT"],
// 1 16 0 8 0 6 0 0 0 -4 0 0 0 6 box5.dat
  [1,16,0,8,0,6,0,0,0,-4,0,0,0,6, ldraw_lib__box5(realsolid)],
// 1 16 0 7 0 9 0 0 0 1 0 0 0 9 box4.dat
  [1,16,0,7,0,9,0,0,0,1,0,0,0,9, ldraw_lib__box4(realsolid)],
// 
// 4 16 9 8 9 6 8 6 -6 8 6 -9 8 9
  [4,16,9,8,9,6,8,6,-6,8,6,-9,8,9],
// 4 16 -9 8 9 -6 8 6 -6 8 -6 -9 8 -9
  [4,16,-9,8,9,-6,8,6,-6,8,-6,-9,8,-9],
// 4 16 -9 8 -9 -6 8 -6 6 8 -6 9 8 -9
  [4,16,-9,8,-9,-6,8,-6,6,8,-6,9,8,-9],
// 4 16 9 8 -9 6 8 -6 6 8 6 9 8 9
  [4,16,9,8,-9,6,8,-6,6,8,6,9,8,9],
// 
// 4 16 10 7 10 9 7 9 -9 7 9 -10 7 10
  [4,16,10,7,10,9,7,9,-9,7,9,-10,7,10],
// 4 16 -10 7 10 -9 7 9 -9 7 -9 -10 7 -10
  [4,16,-10,7,10,-9,7,9,-9,7,-9,-10,7,-10],
// 4 16 -10 7 -10 -9 7 -9 9 7 -9 10 7 -10
  [4,16,-10,7,-10,-9,7,-9,9,7,-9,10,7,-10],
// 4 16 10 7 -10 9 7 -9 9 7 9 10 7 10
  [4,16,10,7,-10,9,7,-9,9,7,9,10,7,10],
// 0
];
module ldraw_lib__s__3070bs01(step=0, col=false, unit=2/5, alt=false, line=0.2, solid=!$preview)
    makepoly(ldraw_lib__s__3070bs01(solid), step=step, col=col, unit=unit, alt=alt, line=line, solid=solid);
ldraw_lib__s__3070bs01(line=0.2);
// main file
use <../lib.scad>
use <s/3070bs01.scad>
$fa=1; $fs=0.2;
function ldraw_lib__3070bp0w(realsolid=false) = [
// 0 Tile  1 x  1 with Dark Turquoise Question Mark in Speech Bubble on Coral Background Pattern
// 0 Name: 3070bp0w.dat
// 0 Author: Philippe Hurbain [Philo]
// 0 !LDRAW_ORG Part UPDATE 2020-03
// 0 !LICENSE Licensed under CC BY 2.0 and CC BY 4.0 : see CAreadme.txt
// 
// 0 BFC CERTIFY CCW
  [0,"BFC","CERTIFY"],
  [0,"BFC","CCW"],
// 
// 0 !KEYWORDS Bricklink 3070bpb156, Dots, Set 41916
// 
// 0 !HISTORY 2020-12-29 [PTadmin] Official Update 2020-03
// 
// 
// 1 16 0 0 0 1 0 0 0 1 0 0 0 1 s\3070bs01.dat
  [1,16,0,0,0,1,0,0,0,1,0,0,0,1, ldraw_lib__s__3070bs01(realsolid)],
// 4 16 10 0 -10 10 0 10 9 0 9 9 0 -9
  [4,16,10,0,-10,10,0,10,9,0,9,9,0,-9],
// 4 16 -9 0 9 9 0 9 10 0 10 -10 0 10
  [4,16,-9,0,9,9,0,9,10,0,10,-10,0,10],
// 4 16 2.67 0 3.79 5.9 0 4.24 4.46 0 5.62 1.84 0 4.82
  [4,16,2.67,0,3.79,5.9,0,4.24,4.46,0,5.62,1.84,0,4.82],
// 4 16 -9 0 -9 -10 0 -10 10 0 -10 9 0 -9
  [4,16,-9,0,-9,-10,0,-10,10,0,-10,9,0,-9],
// 4 16 -9 0 9 -10 0 10 -10 0 -10 -9 0 -9
  [4,16,-9,0,9,-10,0,10,-10,0,-10,-9,0,-9],
// 4 353 0.82 0 6.88 9 0 9 -9 0 9 -1.07 0 6.84
  [4,353,0.82,0,6.88,9,0,9,-9,0,9,-1.07,0,6.84],
// 4 353 -4.21 0 -4.35 -4.24 0 -6.68 -3.37 0 -5.99 -2.67 0 -5.19
  [4,353,-4.21,0,-4.35,-4.24,0,-6.68,-3.37,0,-5.99,-2.67,0,-5.19],
// 3 353 9 0 9 0.82 0 6.88 2.67 0 6.46
  [3,353,9,0,9,0.82,0,6.88,2.67,0,6.46],
// 4 16 6.82 0 2.49 5.9 0 4.24 2.84 0 2.79 2.68 0 1.78
  [4,16,6.82,0,2.49,5.9,0,4.24,2.84,0,2.79,2.68,0,1.78],
// 3 353 9 0 9 2.67 0 6.46 4.46 0 5.62
  [3,353,9,0,9,2.67,0,6.46,4.46,0,5.62],
// 3 353 9 0 9 4.46 0 5.62 5.9 0 4.24
  [3,353,9,0,9,4.46,0,5.62,5.9,0,4.24],
// 4 16 7.13 0 0.53 6.82 0 2.49 2.68 0 1.78 2.21 0 0.87
  [4,16,7.13,0,0.53,6.82,0,2.49,2.68,0,1.78,2.21,0,0.87],
// 3 353 9 0 9 5.9 0 4.24 6.82 0 2.49
  [3,353,9,0,9,5.9,0,4.24,6.82,0,2.49],
// 4 353 9 0 9 6.82 0 2.49 7.13 0 0.53 9 0 -9
  [4,353,9,0,9,6.82,0,2.49,7.13,0,0.53,9,0,-9],
// 3 353 9 0 -9 7.13 0 0.53 6.79 0 -1.43
  [3,353,9,0,-9,7.13,0,0.53,6.79,0,-1.43],
// 4 16 1.84 0 4.82 4.46 0 5.62 2.67 0 6.46 0.67 0 5.34
  [4,16,1.84,0,4.82,4.46,0,5.62,2.67,0,6.46,0.67,0,5.34],
// 4 16 3.21 0 -4.96 1.68 0 -2.81 1.4 0 -3.65 1.57 0 -5.46
  [4,16,3.21,0,-4.96,1.68,0,-2.81,1.4,0,-3.65,1.57,0,-5.46],
// 3 353 1.57 0 -5.46 -0.14 0 -5.55 -0.73 0 -6.17
  [3,353,1.57,0,-5.46,-0.14,0,-5.55,-0.73,0,-6.17],
// 4 16 -3.08 0 -7.08 -2.23 0 -6.96 -1.44 0 -6.65 -0.73 0 -6.17
  [4,16,-3.08,0,-7.08,-2.23,0,-6.96,-1.44,0,-6.65,-0.73,0,-6.17],
// 3 353 -9 0 -9 -3.93 0 -7.02 -4.24 0 -6.68
  [3,353,-9,0,-9,-3.93,0,-7.02,-4.24,0,-6.68],
// 4 3 -1.26 0 3.37 -1.88 0 5.01 -2.81 0 4.07 -2.39 0 3.23
  [4,3,-1.26,0,3.37,-1.88,0,5.01,-2.81,0,4.07,-2.39,0,3.23],
// 4 353 -6.97 0 0.75 -6.74 0 2.25 -9 0 9 -9 0 -9
  [4,353,-6.97,0,0.75,-6.74,0,2.25,-9,0,9,-9,0,-9],
// 4 16 -2.67 0 -5.19 -3.08 0 -7.08 -0.14 0 -5.55 -0.56 0 -3.51
  [4,16,-2.67,0,-5.19,-3.08,0,-7.08,-0.14,0,-5.55,-0.56,0,-3.51],
// 4 3 -0.7 0 -1.4 0 0 -1.54 0.42 0 -1.12 -1.1 0 -0.8
  [4,3,-0.7,0,-1.4,0,0,-1.54,0.42,0,-1.12,-1.1,0,-0.8],
// 4 353 -5.39 0 -3.4 -9 0 -9 -4.24 0 -6.68 -4.21 0 -4.35
  [4,353,-5.39,0,-3.4,-9,0,-9,-4.24,0,-6.68,-4.21,0,-4.35],
// 3 353 -9 0 9 -6.74 0 2.25 -5.89 0 4.07
  [3,353,-9,0,9,-6.74,0,2.25,-5.89,0,4.07],
// 4 16 -4.54 0 5.39 -5.89 0 4.07 -2.81 0 4.07 -2.89 0 6.33
  [4,16,-4.54,0,5.39,-5.89,0,4.07,-2.81,0,4.07,-2.89,0,6.33],
// 3 353 -9 0 9 -5.89 0 4.07 -4.54 0 5.39
  [3,353,-9,0,9,-5.89,0,4.07,-4.54,0,5.39],
// 4 16 -5.89 0 4.07 -6.74 0 2.25 -2.81 0 3.51 -2.81 0 4.07
  [4,16,-5.89,0,4.07,-6.74,0,2.25,-2.81,0,3.51,-2.81,0,4.07],
// 3 353 -9 0 9 -4.54 0 5.39 -2.89 0 6.33
  [3,353,-9,0,9,-4.54,0,5.39,-2.89,0,6.33],
// 4 3 -0.53 0 3.64 0.21 0 3.43 0.67 0 5.34 -0.65 0 5.41
  [4,3,-0.53,0,3.64,0.21,0,3.43,0.67,0,5.34,-0.65,0,5.41],
// 3 353 -9 0 9 -2.89 0 6.33 -1.07 0 6.84
  [3,353,-9,0,9,-2.89,0,6.33,-1.07,0,6.84],
// 4 16 0.28 0 1.4 -0.53 0 3.64 -1.26 0 3.37 -1.26 0 0.7
  [4,16,0.28,0,1.4,-0.53,0,3.64,-1.26,0,3.37,-1.26,0,0.7],
// 4 3 1.48 0 0.3 2.84 0 2.79 0.72 0 2.05 0.28 0 1.4
  [4,3,1.48,0,0.3,2.84,0,2.79,0.72,0,2.05,0.28,0,1.4],
// 3 353 9 0 -9 6.79 0 -1.43 5.9 0 -2.89
  [3,353,9,0,-9,6.79,0,-1.43,5.9,0,-2.89],
// 4 3 2.68 0 1.78 2.84 0 2.79 1.48 0 0.3 2.21 0 0.87
  [4,3,2.68,0,1.78,2.84,0,2.79,1.48,0,0.3,2.21,0,0.87],
// 4 16 0.42 0 -1.96 0.84 0 -1.96 0.42 0 -1.12 0 0 -1.54
  [4,16,0.42,0,-1.96,0.84,0,-1.96,0.42,0,-1.12,0,0,-1.54],
// 4 16 -4.21 0 -4.35 -2.67 0 -5.19 -0.56 0 -2.95 -1.1 0 -0.8
  [4,16,-4.21,0,-4.35,-2.67,0,-5.19,-0.56,0,-2.95,-1.1,0,-0.8],
// 4 3 -0.14 0 -2.39 -0.56 0 -2.95 -0.56 0 -3.51 0 0 -4.07
  [4,3,-0.14,0,-2.39,-0.56,0,-2.95,-0.56,0,-3.51,0,0,-4.07],
// 4 3 0.56 0 -0.14 -1.4 0 -0.14 -1.1 0 -0.8 0.42 0 -1.12
  [4,3,0.56,0,-0.14,-1.4,0,-0.14,-1.1,0,-0.8,0.42,0,-1.12],
// 4 16 -5.39 0 -3.4 -4.21 0 -4.35 -1.1 0 -0.8 -1.4 0 -0.14
  [4,16,-5.39,0,-3.4,-4.21,0,-4.35,-1.1,0,-0.8,-1.4,0,-0.14],
// 4 16 -6.97 0 0.75 -1.4 0 -0.14 -1.26 0 0.7 -2.39 0 3.23
  [4,16,-6.97,0,0.75,-1.4,0,-0.14,-1.26,0,0.7,-2.39,0,3.23],
// 4 3 -1.26 0 0.7 -1.4 0 -0.14 0.56 0 -0.14 0.28 0 1.4
  [4,3,-1.26,0,0.7,-1.4,0,-0.14,0.56,0,-0.14,0.28,0,1.4],
// 4 16 -2.89 0 6.33 -2.81 0 4.07 -1.88 0 5.01 -1.07 0 6.84
  [4,16,-2.89,0,6.33,-2.81,0,4.07,-1.88,0,5.01,-1.07,0,6.84],
// 3 16 -1.26 0 0.7 -1.26 0 3.37 -2.39 0 3.23
  [3,16,-1.26,0,0.7,-1.26,0,3.37,-2.39,0,3.23],
// 4 16 -6.97 0 0.75 -2.39 0 3.23 -2.81 0 3.51 -6.74 0 2.25
  [4,16,-6.97,0,0.75,-2.39,0,3.23,-2.81,0,3.51,-6.74,0,2.25],
// 3 3 -2.39 0 3.23 -2.81 0 4.07 -2.81 0 3.51
  [3,3,-2.39,0,3.23,-2.81,0,4.07,-2.81,0,3.51],
// 4 16 1.48 0 0.3 0.56 0 -0.14 0.42 0 -1.12 1.4 0 -2.25
  [4,16,1.48,0,0.3,0.56,0,-0.14,0.42,0,-1.12,1.4,0,-2.25],
// 3 16 0.84 0 -1.96 1.4 0 -2.25 0.42 0 -1.12
  [3,16,0.84,0,-1.96,1.4,0,-2.25,0.42,0,-1.12],
// 4 3 1.68 0 -2.81 1.4 0 -2.25 0.84 0 -1.96 1.4 0 -3.65
  [4,3,1.68,0,-2.81,1.4,0,-2.25,0.84,0,-1.96,1.4,0,-3.65],
// 4 16 5.9 0 -2.89 2.21 0 0.87 1.4 0 -2.25 1.68 0 -2.81
  [4,16,5.9,0,-2.89,2.21,0,0.87,1.4,0,-2.25,1.68,0,-2.81],
// 4 3 0.7 0 -4.07 1.4 0 -3.65 -0.14 0 -2.39 0 0 -4.07
  [4,3,0.7,0,-4.07,1.4,0,-3.65,-0.14,0,-2.39,0,0,-4.07],
// 4 16 0.7 0 -4.07 0 0 -4.07 -0.14 0 -5.55 1.57 0 -5.46
  [4,16,0.7,0,-4.07,0,0,-4.07,-0.14,0,-5.55,1.57,0,-5.46],
// 3 16 0 0 -4.07 -0.56 0 -3.51 -0.14 0 -5.55
  [3,16,0,0,-4.07,-0.56,0,-3.51,-0.14,0,-5.55],
// 3 16 -0.56 0 -3.51 -0.56 0 -2.95 -2.67 0 -5.19
  [3,16,-0.56,0,-3.51,-0.56,0,-2.95,-2.67,0,-5.19],
// 4 16 -0.7 0 -1.4 -0.56 0 -2.95 -0.14 0 -2.39 0 0 -1.54
  [4,16,-0.7,0,-1.4,-0.56,0,-2.95,-0.14,0,-2.39,0,0,-1.54],
// 4 3 -0.14 0 -2.39 1.4 0 -3.65 0.84 0 -1.96 0.42 0 -1.96
  [4,3,-0.14,0,-2.39,1.4,0,-3.65,0.84,0,-1.96,0.42,0,-1.96],
// 3 16 0 0 -1.54 -0.14 0 -2.39 0.42 0 -1.96
  [3,16,0,0,-1.54,-0.14,0,-2.39,0.42,0,-1.96],
// 4 16 4.68 0 -4.09 5.9 0 -2.89 1.68 0 -2.81 3.21 0 -4.96
  [4,16,4.68,0,-4.09,5.9,0,-2.89,1.68,0,-2.81,3.21,0,-4.96],
// 3 353 9 0 -9 5.9 0 -2.89 4.68 0 -4.09
  [3,353,9,0,-9,5.9,0,-2.89,4.68,0,-4.09],
// 3 353 9 0 -9 4.68 0 -4.09 3.21 0 -4.96
  [3,353,9,0,-9,4.68,0,-4.09,3.21,0,-4.96],
// 3 16 0.7 0 -4.07 1.57 0 -5.46 1.4 0 -3.65
  [3,16,0.7,0,-4.07,1.57,0,-5.46,1.4,0,-3.65],
// 4 353 9 0 -9 3.21 0 -4.96 1.57 0 -5.46 -1.44 0 -6.65
  [4,353,9,0,-9,3.21,0,-4.96,1.57,0,-5.46,-1.44,0,-6.65],
// 4 16 -6.28 0 -2.17 -5.39 0 -3.4 -1.4 0 -0.14 -6.82 0 -0.76
  [4,16,-6.28,0,-2.17,-5.39,0,-3.4,-1.4,0,-0.14,-6.82,0,-0.76],
// 3 353 -6.28 0 -2.17 -9 0 -9 -5.39 0 -3.4
  [3,353,-6.28,0,-2.17,-9,0,-9,-5.39,0,-3.4],
// 3 353 -6.82 0 -0.76 -9 0 -9 -6.28 0 -2.17
  [3,353,-6.82,0,-0.76,-9,0,-9,-6.28,0,-2.17],
// 3 16 -6.82 0 -0.76 -1.4 0 -0.14 -6.97 0 0.75
  [3,16,-6.82,0,-0.76,-1.4,0,-0.14,-6.97,0,0.75],
// 3 353 -6.82 0 -0.76 -6.97 0 0.75 -9 0 -9
  [3,353,-6.82,0,-0.76,-6.97,0,0.75,-9,0,-9],
// 3 16 -0.73 0 -6.17 -0.14 0 -5.55 -3.08 0 -7.08
  [3,16,-0.73,0,-6.17,-0.14,0,-5.55,-3.08,0,-7.08],
// 3 353 -0.73 0 -6.17 -1.44 0 -6.65 1.57 0 -5.46
  [3,353,-0.73,0,-6.17,-1.44,0,-6.65,1.57,0,-5.46],
// 3 353 9 0 -9 -1.44 0 -6.65 -2.23 0 -6.96
  [3,353,9,0,-9,-1.44,0,-6.65,-2.23,0,-6.96],
// 4 353 9 0 -9 -2.23 0 -6.96 -3.08 0 -7.08 -9 0 -9
  [4,353,9,0,-9,-2.23,0,-6.96,-3.08,0,-7.08,-9,0,-9],
// 4 16 -3.37 0 -5.99 -4.24 0 -6.68 -3.93 0 -7.02 -3.08 0 -7.08
  [4,16,-3.37,0,-5.99,-4.24,0,-6.68,-3.93,0,-7.02,-3.08,0,-7.08],
// 3 353 -9 0 -9 -3.08 0 -7.08 -3.93 0 -7.02
  [3,353,-9,0,-9,-3.08,0,-7.08,-3.93,0,-7.02],
// 3 16 -2.67 0 -5.19 -3.37 0 -5.99 -3.08 0 -7.08
  [3,16,-2.67,0,-5.19,-3.37,0,-5.99,-3.08,0,-7.08],
// 4 3 0.69 0 2.82 0.72 0 2.05 2.84 0 2.79 2.67 0 3.79
  [4,3,0.69,0,2.82,0.72,0,2.05,2.84,0,2.79,2.67,0,3.79],
// 4 16 -0.53 0 3.64 0.28 0 1.4 0.72 0 2.05 0.21 0 3.43
  [4,16,-0.53,0,3.64,0.28,0,1.4,0.72,0,2.05,0.21,0,3.43],
// 4 3 0.21 0 3.43 0.69 0 2.82 1.84 0 4.82 0.67 0 5.34
  [4,3,0.21,0,3.43,0.69,0,2.82,1.84,0,4.82,0.67,0,5.34],
// 3 16 0.69 0 2.82 0.21 0 3.43 0.72 0 2.05
  [3,16,0.69,0,2.82,0.21,0,3.43,0.72,0,2.05],
// 4 16 -0.65 0 5.41 0.67 0 5.34 0.82 0 6.88 -1.07 0 6.84
  [4,16,-0.65,0,5.41,0.67,0,5.34,0.82,0,6.88,-1.07,0,6.84],
// 4 3 -1.88 0 5.01 -1.26 0 3.37 -0.53 0 3.64 -0.65 0 5.41
  [4,3,-1.88,0,5.01,-1.26,0,3.37,-0.53,0,3.64,-0.65,0,5.41],
// 3 16 -1.88 0 5.01 -0.65 0 5.41 -1.07 0 6.84
  [3,16,-1.88,0,5.01,-0.65,0,5.41,-1.07,0,6.84],
// 3 16 0.82 0 6.88 0.67 0 5.34 2.67 0 6.46
  [3,16,0.82,0,6.88,0.67,0,5.34,2.67,0,6.46],
// 3 3 2.67 0 3.79 1.84 0 4.82 0.69 0 2.82
  [3,3,2.67,0,3.79,1.84,0,4.82,0.69,0,2.82],
// 4 16 6.79 0 -1.43 7.13 0 0.53 2.21 0 0.87 5.9 0 -2.89
  [4,16,6.79,0,-1.43,7.13,0,0.53,2.21,0,0.87,5.9,0,-2.89],
// 3 16 2.67 0 3.79 2.84 0 2.79 5.9 0 4.24
  [3,16,2.67,0,3.79,2.84,0,2.79,5.9,0,4.24],
// 3 16 1.4 0 -2.25 2.21 0 0.87 1.48 0 0.3
  [3,16,1.4,0,-2.25,2.21,0,0.87,1.48,0,0.3],
// 3 3 0.56 0 -0.14 1.48 0 0.3 0.28 0 1.4
  [3,3,0.56,0,-0.14,1.48,0,0.3,0.28,0,1.4],
// 3 16 -0.7 0 -1.4 -1.1 0 -0.8 -0.56 0 -2.95
  [3,16,-0.7,0,-1.4,-1.1,0,-0.8,-0.56,0,-2.95],
];
module ldraw_lib__3070bp0w(step=0, col=false, unit=2/5, alt=false, line=0.2, solid=!$preview)
    makepoly(ldraw_lib__3070bp0w(solid), step=step, col=col, unit=unit, alt=alt, line=line, solid=solid);
ldraw_lib__3070bp0w(line=0.2);
